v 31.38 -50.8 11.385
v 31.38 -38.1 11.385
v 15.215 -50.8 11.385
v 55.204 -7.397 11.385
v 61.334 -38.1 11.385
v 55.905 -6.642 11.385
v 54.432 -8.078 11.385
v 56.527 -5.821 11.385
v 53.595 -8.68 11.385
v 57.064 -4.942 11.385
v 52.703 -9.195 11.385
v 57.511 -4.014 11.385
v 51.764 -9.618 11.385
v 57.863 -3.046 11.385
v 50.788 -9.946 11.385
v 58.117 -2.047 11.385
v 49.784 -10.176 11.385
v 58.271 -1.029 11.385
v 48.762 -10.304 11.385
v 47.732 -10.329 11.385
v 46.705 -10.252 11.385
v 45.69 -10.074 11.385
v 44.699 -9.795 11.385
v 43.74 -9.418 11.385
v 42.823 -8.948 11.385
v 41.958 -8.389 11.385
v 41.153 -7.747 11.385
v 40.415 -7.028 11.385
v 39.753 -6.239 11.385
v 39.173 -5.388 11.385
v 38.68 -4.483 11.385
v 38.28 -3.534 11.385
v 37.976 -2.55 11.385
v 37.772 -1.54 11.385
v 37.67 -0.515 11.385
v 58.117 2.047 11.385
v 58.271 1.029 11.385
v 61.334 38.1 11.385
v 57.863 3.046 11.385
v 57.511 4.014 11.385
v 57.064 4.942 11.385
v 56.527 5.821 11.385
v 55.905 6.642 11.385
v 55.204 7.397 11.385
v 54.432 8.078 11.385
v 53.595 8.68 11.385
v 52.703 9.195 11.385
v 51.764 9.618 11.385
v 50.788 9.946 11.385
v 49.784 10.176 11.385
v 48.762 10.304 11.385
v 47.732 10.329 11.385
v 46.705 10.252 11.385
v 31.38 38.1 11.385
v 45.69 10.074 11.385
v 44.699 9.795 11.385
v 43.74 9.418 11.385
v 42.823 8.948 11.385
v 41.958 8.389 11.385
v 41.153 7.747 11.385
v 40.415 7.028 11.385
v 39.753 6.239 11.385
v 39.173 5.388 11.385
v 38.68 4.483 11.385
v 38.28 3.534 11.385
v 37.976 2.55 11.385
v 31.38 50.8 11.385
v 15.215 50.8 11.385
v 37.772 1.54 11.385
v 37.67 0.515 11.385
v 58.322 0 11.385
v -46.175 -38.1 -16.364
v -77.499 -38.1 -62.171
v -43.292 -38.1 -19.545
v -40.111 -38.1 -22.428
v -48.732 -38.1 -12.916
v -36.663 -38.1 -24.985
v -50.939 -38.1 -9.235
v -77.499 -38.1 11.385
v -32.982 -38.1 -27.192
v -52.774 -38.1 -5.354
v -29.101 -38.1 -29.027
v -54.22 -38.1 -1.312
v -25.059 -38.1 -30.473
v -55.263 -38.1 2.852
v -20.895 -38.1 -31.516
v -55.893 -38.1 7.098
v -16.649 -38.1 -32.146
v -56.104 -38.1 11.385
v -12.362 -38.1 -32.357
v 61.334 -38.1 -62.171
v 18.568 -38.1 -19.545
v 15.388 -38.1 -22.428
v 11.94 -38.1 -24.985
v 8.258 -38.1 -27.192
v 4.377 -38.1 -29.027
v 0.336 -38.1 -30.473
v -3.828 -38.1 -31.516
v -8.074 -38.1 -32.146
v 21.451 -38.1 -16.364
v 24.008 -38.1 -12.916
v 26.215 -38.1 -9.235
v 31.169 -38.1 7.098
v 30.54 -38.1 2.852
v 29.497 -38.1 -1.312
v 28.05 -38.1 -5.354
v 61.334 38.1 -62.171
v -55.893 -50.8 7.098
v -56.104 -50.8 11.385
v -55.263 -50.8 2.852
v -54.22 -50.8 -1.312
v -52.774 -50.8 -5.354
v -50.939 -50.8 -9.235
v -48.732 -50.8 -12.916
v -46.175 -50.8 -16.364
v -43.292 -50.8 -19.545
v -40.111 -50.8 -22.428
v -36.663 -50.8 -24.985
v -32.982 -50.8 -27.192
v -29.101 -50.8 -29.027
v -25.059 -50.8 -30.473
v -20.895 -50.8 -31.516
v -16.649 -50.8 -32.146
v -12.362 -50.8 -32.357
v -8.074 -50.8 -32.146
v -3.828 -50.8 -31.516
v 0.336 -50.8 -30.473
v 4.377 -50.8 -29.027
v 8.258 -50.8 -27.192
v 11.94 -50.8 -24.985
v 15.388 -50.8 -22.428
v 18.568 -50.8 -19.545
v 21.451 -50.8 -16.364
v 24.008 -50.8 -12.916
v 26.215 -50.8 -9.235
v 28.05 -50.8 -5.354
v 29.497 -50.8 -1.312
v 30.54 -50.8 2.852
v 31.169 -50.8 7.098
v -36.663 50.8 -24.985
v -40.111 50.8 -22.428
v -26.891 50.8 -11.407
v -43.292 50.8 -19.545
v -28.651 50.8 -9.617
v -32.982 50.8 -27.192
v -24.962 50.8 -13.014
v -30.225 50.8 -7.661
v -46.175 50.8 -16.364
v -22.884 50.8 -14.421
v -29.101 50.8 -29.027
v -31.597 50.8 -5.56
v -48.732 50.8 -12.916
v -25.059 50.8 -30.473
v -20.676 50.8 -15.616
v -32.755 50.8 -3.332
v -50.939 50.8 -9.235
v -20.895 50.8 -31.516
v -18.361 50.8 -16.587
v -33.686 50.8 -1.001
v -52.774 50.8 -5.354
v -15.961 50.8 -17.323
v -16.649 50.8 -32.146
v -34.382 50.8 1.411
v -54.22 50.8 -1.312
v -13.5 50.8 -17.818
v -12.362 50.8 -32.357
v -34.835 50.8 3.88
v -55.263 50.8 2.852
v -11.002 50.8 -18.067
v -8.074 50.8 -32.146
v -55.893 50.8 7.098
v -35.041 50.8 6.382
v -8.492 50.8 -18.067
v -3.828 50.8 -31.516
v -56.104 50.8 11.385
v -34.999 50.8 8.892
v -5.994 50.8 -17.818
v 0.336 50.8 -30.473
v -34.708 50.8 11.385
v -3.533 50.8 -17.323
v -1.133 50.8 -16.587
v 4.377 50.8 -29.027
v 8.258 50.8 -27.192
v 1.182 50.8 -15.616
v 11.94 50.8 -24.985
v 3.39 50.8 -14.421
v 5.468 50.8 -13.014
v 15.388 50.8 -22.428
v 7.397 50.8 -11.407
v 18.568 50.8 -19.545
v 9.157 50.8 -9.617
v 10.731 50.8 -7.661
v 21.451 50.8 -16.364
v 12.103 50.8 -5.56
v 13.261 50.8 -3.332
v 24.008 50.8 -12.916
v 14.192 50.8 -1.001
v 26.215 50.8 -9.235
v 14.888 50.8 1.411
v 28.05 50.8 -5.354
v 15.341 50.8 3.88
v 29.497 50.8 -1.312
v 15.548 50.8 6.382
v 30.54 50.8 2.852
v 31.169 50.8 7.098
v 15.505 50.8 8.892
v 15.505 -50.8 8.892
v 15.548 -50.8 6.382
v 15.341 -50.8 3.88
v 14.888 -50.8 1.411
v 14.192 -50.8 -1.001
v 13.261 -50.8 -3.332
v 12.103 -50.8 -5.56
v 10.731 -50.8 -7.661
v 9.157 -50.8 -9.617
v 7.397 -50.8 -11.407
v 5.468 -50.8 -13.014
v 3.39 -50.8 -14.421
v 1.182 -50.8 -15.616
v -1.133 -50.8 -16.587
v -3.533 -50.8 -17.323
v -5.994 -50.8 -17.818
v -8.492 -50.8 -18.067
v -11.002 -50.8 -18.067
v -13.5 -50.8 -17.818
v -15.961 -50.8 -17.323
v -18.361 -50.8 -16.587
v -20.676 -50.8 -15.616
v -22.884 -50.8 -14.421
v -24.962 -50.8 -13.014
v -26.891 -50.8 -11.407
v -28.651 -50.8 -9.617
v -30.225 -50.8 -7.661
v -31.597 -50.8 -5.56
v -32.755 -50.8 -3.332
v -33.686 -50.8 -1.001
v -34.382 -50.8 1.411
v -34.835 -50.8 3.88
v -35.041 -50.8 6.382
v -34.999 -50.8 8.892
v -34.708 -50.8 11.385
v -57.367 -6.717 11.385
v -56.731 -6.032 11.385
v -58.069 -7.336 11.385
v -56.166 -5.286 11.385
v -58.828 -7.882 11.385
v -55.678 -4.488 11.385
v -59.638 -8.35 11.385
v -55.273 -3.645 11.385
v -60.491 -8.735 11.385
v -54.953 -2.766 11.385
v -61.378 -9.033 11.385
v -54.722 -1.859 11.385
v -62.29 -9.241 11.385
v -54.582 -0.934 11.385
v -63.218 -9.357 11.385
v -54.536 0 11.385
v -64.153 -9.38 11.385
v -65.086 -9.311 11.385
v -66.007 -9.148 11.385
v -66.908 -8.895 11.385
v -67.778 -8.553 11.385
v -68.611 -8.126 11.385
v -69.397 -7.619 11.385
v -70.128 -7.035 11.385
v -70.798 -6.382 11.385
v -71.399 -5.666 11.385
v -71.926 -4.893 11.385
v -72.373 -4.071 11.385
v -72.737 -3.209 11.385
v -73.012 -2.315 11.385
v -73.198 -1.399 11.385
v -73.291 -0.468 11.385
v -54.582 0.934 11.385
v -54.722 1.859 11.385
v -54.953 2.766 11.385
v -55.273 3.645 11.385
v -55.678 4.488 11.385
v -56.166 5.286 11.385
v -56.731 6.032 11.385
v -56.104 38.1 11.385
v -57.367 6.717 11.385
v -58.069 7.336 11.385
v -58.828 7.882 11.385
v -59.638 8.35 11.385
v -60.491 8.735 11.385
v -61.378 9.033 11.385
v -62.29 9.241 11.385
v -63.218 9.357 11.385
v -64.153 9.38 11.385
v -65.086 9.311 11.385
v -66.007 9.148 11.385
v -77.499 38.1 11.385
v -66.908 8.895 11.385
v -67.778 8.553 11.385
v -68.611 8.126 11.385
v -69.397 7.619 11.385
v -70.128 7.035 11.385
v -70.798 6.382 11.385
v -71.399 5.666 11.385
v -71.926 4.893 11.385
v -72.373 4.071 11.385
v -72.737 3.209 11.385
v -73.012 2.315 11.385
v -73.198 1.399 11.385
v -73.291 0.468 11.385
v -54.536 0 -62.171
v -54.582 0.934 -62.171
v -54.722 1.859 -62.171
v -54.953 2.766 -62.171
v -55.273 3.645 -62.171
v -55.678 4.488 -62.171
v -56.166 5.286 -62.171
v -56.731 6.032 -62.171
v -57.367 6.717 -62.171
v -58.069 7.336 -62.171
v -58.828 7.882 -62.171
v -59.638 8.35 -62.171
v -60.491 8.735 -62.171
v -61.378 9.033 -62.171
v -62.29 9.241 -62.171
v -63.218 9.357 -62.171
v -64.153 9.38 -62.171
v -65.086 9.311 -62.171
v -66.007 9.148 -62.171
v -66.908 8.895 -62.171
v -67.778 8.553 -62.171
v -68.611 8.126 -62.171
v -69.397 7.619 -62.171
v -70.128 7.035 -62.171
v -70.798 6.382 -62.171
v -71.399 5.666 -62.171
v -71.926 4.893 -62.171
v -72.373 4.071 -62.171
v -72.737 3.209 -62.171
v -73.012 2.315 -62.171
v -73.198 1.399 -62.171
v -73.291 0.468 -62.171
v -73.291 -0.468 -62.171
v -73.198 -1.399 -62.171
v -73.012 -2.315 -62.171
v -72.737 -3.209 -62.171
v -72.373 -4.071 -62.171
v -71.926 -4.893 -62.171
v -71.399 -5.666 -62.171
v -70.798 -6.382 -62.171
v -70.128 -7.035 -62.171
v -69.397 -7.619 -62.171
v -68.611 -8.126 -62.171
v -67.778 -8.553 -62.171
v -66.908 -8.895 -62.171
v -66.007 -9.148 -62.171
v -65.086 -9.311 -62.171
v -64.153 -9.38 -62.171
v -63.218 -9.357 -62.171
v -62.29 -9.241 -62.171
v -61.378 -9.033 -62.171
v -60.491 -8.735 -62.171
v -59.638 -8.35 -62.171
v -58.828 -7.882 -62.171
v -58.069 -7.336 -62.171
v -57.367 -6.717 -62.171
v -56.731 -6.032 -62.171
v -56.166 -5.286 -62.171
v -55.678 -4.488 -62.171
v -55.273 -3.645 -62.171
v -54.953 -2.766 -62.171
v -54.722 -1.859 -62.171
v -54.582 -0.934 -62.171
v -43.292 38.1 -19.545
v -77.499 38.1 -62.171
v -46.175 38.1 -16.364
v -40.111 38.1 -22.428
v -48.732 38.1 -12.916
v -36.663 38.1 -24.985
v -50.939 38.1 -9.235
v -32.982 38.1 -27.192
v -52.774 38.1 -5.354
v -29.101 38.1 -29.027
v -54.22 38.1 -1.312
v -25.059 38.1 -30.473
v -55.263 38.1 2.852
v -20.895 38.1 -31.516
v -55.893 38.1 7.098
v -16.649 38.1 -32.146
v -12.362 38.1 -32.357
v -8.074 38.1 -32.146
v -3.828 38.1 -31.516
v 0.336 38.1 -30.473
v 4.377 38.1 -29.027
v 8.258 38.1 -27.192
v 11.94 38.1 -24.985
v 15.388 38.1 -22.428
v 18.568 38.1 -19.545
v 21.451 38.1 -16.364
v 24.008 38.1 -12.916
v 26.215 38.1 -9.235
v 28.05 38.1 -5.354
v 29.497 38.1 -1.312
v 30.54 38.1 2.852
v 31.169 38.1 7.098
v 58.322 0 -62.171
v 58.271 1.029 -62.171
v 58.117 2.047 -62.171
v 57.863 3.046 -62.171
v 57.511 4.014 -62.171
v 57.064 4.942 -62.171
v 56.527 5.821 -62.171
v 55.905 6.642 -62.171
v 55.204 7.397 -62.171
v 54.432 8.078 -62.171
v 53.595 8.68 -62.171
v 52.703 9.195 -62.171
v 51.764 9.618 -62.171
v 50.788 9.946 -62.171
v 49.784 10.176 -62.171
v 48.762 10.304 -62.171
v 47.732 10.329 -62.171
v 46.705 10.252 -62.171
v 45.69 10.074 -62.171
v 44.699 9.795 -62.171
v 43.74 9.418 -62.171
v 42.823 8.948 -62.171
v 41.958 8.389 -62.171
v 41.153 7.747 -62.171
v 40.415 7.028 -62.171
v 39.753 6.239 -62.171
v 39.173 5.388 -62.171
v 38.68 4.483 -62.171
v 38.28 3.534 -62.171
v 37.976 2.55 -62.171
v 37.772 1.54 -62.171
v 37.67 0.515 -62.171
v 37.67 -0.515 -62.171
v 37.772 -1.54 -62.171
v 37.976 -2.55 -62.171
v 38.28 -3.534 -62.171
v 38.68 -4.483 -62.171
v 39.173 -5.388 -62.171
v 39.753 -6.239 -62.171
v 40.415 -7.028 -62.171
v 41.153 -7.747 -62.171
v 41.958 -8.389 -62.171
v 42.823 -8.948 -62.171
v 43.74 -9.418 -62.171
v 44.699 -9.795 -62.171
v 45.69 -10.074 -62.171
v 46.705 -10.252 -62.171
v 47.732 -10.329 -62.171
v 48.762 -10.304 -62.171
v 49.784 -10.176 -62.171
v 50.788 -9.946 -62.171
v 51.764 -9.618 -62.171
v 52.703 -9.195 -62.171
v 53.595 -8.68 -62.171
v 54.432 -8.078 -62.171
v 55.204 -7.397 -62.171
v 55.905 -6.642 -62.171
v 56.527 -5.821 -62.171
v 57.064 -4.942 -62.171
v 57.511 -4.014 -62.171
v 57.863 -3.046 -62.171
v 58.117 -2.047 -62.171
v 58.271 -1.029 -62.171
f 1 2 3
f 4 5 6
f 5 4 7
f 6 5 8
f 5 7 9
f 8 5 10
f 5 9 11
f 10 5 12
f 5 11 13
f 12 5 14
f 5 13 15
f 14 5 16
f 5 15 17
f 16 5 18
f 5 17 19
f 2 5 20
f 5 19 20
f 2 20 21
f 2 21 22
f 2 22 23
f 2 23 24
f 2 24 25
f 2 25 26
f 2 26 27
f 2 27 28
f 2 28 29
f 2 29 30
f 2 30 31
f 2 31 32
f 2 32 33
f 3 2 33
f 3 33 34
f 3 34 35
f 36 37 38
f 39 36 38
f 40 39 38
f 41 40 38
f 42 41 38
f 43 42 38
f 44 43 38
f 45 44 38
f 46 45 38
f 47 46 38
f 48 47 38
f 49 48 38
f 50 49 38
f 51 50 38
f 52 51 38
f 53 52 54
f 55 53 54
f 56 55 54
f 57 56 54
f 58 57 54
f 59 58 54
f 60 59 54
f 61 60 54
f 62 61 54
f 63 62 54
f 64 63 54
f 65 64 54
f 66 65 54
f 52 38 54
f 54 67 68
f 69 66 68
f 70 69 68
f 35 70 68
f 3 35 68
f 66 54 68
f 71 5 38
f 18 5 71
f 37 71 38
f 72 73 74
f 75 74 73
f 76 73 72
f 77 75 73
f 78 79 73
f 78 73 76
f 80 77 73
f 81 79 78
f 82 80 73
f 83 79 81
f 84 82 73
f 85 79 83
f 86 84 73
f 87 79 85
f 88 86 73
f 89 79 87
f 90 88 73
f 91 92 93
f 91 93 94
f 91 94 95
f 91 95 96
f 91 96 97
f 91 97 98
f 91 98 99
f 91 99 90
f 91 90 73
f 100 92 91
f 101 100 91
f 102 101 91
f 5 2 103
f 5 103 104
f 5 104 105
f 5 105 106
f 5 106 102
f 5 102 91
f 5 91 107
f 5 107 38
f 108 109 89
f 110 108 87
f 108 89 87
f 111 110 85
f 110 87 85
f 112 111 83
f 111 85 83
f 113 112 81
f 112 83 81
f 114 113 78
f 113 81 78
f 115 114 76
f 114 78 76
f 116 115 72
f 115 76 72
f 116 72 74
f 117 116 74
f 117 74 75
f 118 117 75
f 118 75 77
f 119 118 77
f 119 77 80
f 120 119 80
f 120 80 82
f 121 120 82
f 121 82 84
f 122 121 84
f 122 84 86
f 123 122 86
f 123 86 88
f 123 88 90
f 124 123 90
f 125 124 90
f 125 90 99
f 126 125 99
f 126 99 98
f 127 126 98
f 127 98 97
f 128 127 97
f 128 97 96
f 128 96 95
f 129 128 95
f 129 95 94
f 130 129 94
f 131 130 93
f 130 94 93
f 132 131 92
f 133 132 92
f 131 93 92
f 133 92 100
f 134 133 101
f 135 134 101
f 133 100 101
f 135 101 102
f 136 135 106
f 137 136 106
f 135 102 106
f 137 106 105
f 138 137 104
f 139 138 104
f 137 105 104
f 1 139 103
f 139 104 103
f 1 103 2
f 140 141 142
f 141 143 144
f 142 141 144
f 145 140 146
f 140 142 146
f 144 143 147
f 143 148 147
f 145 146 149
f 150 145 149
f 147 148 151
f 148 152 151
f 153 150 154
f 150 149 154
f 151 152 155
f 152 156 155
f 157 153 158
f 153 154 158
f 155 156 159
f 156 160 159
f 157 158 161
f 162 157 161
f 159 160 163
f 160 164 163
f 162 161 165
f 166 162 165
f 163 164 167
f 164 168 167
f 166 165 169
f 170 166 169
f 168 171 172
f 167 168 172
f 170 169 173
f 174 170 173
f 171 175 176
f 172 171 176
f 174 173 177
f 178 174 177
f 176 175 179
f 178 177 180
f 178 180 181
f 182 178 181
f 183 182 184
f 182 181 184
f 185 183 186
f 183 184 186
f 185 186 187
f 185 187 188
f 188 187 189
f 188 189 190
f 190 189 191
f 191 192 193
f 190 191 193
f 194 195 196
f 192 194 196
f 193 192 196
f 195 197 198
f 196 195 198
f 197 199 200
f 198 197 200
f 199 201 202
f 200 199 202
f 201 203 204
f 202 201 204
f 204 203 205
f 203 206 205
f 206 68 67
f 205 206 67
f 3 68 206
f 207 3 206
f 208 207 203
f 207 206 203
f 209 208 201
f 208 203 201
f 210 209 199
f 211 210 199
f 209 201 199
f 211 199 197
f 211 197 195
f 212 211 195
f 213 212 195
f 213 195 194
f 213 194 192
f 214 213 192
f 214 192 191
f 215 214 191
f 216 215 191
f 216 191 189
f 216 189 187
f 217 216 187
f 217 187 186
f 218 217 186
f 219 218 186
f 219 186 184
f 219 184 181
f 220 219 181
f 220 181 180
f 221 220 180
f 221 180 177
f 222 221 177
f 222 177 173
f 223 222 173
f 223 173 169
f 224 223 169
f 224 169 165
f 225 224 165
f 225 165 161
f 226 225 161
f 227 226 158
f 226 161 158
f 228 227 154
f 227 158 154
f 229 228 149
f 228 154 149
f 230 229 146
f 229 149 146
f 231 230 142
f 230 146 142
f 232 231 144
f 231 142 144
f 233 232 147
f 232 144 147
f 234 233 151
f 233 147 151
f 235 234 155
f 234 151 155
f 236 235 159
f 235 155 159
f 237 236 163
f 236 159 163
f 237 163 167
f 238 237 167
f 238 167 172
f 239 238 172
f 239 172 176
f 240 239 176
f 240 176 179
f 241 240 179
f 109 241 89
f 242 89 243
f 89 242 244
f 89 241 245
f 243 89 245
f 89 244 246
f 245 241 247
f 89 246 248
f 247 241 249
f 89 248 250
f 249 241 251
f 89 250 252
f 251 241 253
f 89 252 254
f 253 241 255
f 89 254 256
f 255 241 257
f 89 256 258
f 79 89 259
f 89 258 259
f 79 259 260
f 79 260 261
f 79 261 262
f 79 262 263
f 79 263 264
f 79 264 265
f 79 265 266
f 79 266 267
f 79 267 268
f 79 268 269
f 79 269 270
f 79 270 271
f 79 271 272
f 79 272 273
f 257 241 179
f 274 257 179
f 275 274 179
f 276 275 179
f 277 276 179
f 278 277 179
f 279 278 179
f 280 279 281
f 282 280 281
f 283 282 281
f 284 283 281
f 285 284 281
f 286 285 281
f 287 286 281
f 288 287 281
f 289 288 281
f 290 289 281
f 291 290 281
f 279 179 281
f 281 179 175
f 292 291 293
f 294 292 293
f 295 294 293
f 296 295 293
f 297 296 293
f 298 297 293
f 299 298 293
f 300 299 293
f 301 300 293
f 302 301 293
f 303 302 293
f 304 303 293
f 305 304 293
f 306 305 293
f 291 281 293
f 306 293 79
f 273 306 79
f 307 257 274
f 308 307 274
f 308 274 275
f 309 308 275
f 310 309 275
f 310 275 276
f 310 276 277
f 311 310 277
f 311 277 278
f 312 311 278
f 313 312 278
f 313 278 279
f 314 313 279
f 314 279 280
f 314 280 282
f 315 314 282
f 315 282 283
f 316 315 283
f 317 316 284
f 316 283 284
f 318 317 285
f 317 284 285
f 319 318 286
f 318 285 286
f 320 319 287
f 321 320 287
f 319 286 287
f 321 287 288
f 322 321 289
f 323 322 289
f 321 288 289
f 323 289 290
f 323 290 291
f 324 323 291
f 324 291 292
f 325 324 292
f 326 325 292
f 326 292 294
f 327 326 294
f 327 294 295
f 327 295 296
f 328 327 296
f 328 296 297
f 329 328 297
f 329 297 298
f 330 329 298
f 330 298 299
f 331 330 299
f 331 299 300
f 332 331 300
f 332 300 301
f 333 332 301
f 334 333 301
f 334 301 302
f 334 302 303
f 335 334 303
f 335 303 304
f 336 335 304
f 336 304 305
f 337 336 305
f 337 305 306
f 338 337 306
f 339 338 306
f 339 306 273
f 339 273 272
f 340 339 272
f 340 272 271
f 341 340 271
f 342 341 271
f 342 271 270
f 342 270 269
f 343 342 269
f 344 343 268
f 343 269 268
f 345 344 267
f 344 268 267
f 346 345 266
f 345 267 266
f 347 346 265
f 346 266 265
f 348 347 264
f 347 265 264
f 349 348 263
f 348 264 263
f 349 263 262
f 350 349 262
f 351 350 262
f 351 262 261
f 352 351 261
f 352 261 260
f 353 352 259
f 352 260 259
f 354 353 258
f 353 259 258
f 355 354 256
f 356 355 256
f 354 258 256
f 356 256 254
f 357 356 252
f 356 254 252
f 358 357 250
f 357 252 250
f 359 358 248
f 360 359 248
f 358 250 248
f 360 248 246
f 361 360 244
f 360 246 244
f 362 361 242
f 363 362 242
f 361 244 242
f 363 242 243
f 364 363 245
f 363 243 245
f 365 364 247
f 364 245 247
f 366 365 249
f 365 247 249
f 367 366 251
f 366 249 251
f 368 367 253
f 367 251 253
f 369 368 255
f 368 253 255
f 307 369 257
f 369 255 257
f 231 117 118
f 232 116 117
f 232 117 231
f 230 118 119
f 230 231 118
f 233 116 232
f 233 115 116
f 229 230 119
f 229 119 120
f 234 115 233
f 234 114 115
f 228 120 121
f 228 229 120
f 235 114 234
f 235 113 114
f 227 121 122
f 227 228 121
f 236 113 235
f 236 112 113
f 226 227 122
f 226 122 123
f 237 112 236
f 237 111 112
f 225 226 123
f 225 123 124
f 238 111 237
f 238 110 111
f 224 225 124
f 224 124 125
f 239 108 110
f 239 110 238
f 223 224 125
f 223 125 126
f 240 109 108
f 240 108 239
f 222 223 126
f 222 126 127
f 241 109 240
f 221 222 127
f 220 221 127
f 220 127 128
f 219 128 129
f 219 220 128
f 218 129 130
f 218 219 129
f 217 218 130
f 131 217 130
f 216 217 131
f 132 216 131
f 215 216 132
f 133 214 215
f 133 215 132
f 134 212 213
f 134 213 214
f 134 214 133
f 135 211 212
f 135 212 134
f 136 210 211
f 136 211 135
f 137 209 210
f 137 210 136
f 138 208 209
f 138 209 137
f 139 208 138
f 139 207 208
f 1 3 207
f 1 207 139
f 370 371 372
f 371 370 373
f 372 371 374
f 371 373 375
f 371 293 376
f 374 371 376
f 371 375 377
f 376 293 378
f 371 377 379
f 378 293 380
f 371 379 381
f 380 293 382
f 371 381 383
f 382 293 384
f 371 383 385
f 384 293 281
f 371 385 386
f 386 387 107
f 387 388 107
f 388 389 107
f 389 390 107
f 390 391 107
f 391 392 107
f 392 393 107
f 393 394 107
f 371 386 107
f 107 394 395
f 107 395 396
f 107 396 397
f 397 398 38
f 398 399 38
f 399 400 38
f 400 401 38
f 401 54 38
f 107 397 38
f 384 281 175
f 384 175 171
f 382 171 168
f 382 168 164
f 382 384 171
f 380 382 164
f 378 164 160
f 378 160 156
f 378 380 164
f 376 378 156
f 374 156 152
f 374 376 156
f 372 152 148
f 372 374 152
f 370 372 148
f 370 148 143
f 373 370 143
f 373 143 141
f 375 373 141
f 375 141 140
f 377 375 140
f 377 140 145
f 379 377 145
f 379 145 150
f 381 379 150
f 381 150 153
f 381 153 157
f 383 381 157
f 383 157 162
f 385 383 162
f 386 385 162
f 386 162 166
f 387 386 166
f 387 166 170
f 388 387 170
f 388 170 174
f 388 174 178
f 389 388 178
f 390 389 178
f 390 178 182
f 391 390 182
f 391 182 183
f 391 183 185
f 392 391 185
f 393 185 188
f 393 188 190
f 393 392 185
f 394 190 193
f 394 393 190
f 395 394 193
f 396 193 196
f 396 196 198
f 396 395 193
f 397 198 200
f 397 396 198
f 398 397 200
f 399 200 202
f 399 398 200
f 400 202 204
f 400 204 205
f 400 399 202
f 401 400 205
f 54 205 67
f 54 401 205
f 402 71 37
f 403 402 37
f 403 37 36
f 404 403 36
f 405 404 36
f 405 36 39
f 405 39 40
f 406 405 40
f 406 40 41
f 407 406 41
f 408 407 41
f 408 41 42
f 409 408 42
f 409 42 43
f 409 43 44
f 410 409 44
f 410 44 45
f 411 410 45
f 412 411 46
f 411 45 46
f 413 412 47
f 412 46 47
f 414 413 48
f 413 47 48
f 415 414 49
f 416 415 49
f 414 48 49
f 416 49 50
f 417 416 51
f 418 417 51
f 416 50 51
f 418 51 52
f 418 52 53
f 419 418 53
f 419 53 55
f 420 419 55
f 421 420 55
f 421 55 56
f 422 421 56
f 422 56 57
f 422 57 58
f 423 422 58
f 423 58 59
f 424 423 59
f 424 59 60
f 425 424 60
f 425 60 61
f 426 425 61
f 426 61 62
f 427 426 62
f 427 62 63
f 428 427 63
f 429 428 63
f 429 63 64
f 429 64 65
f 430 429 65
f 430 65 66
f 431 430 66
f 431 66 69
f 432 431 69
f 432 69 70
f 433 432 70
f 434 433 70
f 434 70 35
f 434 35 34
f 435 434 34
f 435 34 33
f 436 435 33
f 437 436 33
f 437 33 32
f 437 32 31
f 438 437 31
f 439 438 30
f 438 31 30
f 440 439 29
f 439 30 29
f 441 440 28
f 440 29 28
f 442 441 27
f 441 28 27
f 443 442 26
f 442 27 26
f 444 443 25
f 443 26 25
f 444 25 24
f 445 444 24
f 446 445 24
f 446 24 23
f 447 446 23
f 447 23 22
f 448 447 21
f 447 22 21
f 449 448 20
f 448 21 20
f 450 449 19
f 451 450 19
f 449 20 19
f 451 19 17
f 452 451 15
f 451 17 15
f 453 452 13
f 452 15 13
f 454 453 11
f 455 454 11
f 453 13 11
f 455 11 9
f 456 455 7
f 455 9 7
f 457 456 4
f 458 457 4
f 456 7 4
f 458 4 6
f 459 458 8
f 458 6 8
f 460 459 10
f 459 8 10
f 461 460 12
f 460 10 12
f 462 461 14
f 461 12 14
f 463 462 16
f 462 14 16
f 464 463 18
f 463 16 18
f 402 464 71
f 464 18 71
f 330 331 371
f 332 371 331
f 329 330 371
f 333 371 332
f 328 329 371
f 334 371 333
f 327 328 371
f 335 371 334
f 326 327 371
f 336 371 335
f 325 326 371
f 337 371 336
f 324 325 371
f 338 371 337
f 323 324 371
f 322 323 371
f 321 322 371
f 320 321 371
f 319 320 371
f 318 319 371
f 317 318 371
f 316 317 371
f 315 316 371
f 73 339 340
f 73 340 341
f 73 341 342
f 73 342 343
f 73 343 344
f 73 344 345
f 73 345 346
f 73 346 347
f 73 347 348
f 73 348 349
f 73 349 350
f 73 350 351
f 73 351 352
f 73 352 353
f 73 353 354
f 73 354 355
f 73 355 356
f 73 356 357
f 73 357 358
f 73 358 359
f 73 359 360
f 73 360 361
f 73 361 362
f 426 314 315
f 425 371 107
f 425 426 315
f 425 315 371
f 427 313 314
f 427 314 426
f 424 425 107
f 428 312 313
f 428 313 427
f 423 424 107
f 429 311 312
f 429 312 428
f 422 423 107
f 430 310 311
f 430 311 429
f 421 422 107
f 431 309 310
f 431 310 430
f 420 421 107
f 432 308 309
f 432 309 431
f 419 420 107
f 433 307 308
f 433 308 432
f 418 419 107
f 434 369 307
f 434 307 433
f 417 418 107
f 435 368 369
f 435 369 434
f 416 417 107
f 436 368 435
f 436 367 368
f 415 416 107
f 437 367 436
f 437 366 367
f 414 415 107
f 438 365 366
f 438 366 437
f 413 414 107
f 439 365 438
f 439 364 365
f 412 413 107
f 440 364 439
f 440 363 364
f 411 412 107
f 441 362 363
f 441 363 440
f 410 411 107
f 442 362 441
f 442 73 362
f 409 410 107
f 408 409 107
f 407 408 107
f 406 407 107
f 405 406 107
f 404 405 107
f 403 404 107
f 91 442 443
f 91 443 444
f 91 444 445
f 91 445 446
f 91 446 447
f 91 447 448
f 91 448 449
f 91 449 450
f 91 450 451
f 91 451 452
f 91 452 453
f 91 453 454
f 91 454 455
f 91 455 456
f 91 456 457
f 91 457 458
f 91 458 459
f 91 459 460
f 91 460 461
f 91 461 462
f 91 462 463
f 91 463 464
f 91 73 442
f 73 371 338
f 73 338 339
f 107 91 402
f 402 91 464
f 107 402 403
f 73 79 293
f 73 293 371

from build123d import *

# Parameters (mm, degrees)
F1_DEPTH      = 38.1
F1_DEPTH_BACK = 38.1
F3_DEPTH      = 50.8
F3_DEPTH_BACK = 50.8
F4_R          = 10.332617
F4_R_2        = 9.383371
F5_DEPTH      = 73.557125


with BuildPart() as f1:
    # F0 (on Front) → F1 (new body, two sides)
    with BuildSketch(Plane.XZ) as f1_sk:
        with BuildLine():
            Line((-34.708198, 11.385217), (-77.499136, 11.385217))
            Line((-77.499136, 11.385217), (-77.499136, -62.170908))
            Line((-77.499136, -62.170908), (61.333679, -62.170908))
            Line((61.333679, -62.170908), (61.333679, 11.385217))
            Line((61.333679, 11.385217), (15.214554, 11.385217))
            ThreePointArc((15.214554, 11.385217), (-9.746822, -18.097968), (-34.708198, 11.385217))
        make_face()
    extrude(amount=F1_DEPTH)
    extrude(f1_sk.sketch, amount=-F1_DEPTH_BACK)

    # F2 (on Front) → F3 (join, two sides)
    with BuildSketch(Plane.XZ) as f3_sk:
        with BuildLine():
            ThreePointArc((15.214554, 11.385217), (-9.746822, -18.097968), (-34.708198, 11.385217))
            Line((-34.708198, 11.385217), (-56.103667, 11.385217))
            ThreePointArc((-56.103667, 11.385217), (-12.361825, -32.356624), (31.380016, 11.385217))
            Line((31.380016, 11.385217), (15.214554, 11.385217))
        make_face()
    extrude(amount=F3_DEPTH)
    extrude(f3_sk.sketch, amount=-F3_DEPTH_BACK)

    # F4 (on face) → F5 (cut, through all)
    with BuildSketch(Plane.XY.offset(11.385217)):
        with Locations((47.989529, 0)):
            Circle(F4_R)
        with Locations((-63.91912, 0)):
            Circle(F4_R_2)
    extrude(amount=-F5_DEPTH, mode=Mode.SUBTRACT)


solid = f1.part
